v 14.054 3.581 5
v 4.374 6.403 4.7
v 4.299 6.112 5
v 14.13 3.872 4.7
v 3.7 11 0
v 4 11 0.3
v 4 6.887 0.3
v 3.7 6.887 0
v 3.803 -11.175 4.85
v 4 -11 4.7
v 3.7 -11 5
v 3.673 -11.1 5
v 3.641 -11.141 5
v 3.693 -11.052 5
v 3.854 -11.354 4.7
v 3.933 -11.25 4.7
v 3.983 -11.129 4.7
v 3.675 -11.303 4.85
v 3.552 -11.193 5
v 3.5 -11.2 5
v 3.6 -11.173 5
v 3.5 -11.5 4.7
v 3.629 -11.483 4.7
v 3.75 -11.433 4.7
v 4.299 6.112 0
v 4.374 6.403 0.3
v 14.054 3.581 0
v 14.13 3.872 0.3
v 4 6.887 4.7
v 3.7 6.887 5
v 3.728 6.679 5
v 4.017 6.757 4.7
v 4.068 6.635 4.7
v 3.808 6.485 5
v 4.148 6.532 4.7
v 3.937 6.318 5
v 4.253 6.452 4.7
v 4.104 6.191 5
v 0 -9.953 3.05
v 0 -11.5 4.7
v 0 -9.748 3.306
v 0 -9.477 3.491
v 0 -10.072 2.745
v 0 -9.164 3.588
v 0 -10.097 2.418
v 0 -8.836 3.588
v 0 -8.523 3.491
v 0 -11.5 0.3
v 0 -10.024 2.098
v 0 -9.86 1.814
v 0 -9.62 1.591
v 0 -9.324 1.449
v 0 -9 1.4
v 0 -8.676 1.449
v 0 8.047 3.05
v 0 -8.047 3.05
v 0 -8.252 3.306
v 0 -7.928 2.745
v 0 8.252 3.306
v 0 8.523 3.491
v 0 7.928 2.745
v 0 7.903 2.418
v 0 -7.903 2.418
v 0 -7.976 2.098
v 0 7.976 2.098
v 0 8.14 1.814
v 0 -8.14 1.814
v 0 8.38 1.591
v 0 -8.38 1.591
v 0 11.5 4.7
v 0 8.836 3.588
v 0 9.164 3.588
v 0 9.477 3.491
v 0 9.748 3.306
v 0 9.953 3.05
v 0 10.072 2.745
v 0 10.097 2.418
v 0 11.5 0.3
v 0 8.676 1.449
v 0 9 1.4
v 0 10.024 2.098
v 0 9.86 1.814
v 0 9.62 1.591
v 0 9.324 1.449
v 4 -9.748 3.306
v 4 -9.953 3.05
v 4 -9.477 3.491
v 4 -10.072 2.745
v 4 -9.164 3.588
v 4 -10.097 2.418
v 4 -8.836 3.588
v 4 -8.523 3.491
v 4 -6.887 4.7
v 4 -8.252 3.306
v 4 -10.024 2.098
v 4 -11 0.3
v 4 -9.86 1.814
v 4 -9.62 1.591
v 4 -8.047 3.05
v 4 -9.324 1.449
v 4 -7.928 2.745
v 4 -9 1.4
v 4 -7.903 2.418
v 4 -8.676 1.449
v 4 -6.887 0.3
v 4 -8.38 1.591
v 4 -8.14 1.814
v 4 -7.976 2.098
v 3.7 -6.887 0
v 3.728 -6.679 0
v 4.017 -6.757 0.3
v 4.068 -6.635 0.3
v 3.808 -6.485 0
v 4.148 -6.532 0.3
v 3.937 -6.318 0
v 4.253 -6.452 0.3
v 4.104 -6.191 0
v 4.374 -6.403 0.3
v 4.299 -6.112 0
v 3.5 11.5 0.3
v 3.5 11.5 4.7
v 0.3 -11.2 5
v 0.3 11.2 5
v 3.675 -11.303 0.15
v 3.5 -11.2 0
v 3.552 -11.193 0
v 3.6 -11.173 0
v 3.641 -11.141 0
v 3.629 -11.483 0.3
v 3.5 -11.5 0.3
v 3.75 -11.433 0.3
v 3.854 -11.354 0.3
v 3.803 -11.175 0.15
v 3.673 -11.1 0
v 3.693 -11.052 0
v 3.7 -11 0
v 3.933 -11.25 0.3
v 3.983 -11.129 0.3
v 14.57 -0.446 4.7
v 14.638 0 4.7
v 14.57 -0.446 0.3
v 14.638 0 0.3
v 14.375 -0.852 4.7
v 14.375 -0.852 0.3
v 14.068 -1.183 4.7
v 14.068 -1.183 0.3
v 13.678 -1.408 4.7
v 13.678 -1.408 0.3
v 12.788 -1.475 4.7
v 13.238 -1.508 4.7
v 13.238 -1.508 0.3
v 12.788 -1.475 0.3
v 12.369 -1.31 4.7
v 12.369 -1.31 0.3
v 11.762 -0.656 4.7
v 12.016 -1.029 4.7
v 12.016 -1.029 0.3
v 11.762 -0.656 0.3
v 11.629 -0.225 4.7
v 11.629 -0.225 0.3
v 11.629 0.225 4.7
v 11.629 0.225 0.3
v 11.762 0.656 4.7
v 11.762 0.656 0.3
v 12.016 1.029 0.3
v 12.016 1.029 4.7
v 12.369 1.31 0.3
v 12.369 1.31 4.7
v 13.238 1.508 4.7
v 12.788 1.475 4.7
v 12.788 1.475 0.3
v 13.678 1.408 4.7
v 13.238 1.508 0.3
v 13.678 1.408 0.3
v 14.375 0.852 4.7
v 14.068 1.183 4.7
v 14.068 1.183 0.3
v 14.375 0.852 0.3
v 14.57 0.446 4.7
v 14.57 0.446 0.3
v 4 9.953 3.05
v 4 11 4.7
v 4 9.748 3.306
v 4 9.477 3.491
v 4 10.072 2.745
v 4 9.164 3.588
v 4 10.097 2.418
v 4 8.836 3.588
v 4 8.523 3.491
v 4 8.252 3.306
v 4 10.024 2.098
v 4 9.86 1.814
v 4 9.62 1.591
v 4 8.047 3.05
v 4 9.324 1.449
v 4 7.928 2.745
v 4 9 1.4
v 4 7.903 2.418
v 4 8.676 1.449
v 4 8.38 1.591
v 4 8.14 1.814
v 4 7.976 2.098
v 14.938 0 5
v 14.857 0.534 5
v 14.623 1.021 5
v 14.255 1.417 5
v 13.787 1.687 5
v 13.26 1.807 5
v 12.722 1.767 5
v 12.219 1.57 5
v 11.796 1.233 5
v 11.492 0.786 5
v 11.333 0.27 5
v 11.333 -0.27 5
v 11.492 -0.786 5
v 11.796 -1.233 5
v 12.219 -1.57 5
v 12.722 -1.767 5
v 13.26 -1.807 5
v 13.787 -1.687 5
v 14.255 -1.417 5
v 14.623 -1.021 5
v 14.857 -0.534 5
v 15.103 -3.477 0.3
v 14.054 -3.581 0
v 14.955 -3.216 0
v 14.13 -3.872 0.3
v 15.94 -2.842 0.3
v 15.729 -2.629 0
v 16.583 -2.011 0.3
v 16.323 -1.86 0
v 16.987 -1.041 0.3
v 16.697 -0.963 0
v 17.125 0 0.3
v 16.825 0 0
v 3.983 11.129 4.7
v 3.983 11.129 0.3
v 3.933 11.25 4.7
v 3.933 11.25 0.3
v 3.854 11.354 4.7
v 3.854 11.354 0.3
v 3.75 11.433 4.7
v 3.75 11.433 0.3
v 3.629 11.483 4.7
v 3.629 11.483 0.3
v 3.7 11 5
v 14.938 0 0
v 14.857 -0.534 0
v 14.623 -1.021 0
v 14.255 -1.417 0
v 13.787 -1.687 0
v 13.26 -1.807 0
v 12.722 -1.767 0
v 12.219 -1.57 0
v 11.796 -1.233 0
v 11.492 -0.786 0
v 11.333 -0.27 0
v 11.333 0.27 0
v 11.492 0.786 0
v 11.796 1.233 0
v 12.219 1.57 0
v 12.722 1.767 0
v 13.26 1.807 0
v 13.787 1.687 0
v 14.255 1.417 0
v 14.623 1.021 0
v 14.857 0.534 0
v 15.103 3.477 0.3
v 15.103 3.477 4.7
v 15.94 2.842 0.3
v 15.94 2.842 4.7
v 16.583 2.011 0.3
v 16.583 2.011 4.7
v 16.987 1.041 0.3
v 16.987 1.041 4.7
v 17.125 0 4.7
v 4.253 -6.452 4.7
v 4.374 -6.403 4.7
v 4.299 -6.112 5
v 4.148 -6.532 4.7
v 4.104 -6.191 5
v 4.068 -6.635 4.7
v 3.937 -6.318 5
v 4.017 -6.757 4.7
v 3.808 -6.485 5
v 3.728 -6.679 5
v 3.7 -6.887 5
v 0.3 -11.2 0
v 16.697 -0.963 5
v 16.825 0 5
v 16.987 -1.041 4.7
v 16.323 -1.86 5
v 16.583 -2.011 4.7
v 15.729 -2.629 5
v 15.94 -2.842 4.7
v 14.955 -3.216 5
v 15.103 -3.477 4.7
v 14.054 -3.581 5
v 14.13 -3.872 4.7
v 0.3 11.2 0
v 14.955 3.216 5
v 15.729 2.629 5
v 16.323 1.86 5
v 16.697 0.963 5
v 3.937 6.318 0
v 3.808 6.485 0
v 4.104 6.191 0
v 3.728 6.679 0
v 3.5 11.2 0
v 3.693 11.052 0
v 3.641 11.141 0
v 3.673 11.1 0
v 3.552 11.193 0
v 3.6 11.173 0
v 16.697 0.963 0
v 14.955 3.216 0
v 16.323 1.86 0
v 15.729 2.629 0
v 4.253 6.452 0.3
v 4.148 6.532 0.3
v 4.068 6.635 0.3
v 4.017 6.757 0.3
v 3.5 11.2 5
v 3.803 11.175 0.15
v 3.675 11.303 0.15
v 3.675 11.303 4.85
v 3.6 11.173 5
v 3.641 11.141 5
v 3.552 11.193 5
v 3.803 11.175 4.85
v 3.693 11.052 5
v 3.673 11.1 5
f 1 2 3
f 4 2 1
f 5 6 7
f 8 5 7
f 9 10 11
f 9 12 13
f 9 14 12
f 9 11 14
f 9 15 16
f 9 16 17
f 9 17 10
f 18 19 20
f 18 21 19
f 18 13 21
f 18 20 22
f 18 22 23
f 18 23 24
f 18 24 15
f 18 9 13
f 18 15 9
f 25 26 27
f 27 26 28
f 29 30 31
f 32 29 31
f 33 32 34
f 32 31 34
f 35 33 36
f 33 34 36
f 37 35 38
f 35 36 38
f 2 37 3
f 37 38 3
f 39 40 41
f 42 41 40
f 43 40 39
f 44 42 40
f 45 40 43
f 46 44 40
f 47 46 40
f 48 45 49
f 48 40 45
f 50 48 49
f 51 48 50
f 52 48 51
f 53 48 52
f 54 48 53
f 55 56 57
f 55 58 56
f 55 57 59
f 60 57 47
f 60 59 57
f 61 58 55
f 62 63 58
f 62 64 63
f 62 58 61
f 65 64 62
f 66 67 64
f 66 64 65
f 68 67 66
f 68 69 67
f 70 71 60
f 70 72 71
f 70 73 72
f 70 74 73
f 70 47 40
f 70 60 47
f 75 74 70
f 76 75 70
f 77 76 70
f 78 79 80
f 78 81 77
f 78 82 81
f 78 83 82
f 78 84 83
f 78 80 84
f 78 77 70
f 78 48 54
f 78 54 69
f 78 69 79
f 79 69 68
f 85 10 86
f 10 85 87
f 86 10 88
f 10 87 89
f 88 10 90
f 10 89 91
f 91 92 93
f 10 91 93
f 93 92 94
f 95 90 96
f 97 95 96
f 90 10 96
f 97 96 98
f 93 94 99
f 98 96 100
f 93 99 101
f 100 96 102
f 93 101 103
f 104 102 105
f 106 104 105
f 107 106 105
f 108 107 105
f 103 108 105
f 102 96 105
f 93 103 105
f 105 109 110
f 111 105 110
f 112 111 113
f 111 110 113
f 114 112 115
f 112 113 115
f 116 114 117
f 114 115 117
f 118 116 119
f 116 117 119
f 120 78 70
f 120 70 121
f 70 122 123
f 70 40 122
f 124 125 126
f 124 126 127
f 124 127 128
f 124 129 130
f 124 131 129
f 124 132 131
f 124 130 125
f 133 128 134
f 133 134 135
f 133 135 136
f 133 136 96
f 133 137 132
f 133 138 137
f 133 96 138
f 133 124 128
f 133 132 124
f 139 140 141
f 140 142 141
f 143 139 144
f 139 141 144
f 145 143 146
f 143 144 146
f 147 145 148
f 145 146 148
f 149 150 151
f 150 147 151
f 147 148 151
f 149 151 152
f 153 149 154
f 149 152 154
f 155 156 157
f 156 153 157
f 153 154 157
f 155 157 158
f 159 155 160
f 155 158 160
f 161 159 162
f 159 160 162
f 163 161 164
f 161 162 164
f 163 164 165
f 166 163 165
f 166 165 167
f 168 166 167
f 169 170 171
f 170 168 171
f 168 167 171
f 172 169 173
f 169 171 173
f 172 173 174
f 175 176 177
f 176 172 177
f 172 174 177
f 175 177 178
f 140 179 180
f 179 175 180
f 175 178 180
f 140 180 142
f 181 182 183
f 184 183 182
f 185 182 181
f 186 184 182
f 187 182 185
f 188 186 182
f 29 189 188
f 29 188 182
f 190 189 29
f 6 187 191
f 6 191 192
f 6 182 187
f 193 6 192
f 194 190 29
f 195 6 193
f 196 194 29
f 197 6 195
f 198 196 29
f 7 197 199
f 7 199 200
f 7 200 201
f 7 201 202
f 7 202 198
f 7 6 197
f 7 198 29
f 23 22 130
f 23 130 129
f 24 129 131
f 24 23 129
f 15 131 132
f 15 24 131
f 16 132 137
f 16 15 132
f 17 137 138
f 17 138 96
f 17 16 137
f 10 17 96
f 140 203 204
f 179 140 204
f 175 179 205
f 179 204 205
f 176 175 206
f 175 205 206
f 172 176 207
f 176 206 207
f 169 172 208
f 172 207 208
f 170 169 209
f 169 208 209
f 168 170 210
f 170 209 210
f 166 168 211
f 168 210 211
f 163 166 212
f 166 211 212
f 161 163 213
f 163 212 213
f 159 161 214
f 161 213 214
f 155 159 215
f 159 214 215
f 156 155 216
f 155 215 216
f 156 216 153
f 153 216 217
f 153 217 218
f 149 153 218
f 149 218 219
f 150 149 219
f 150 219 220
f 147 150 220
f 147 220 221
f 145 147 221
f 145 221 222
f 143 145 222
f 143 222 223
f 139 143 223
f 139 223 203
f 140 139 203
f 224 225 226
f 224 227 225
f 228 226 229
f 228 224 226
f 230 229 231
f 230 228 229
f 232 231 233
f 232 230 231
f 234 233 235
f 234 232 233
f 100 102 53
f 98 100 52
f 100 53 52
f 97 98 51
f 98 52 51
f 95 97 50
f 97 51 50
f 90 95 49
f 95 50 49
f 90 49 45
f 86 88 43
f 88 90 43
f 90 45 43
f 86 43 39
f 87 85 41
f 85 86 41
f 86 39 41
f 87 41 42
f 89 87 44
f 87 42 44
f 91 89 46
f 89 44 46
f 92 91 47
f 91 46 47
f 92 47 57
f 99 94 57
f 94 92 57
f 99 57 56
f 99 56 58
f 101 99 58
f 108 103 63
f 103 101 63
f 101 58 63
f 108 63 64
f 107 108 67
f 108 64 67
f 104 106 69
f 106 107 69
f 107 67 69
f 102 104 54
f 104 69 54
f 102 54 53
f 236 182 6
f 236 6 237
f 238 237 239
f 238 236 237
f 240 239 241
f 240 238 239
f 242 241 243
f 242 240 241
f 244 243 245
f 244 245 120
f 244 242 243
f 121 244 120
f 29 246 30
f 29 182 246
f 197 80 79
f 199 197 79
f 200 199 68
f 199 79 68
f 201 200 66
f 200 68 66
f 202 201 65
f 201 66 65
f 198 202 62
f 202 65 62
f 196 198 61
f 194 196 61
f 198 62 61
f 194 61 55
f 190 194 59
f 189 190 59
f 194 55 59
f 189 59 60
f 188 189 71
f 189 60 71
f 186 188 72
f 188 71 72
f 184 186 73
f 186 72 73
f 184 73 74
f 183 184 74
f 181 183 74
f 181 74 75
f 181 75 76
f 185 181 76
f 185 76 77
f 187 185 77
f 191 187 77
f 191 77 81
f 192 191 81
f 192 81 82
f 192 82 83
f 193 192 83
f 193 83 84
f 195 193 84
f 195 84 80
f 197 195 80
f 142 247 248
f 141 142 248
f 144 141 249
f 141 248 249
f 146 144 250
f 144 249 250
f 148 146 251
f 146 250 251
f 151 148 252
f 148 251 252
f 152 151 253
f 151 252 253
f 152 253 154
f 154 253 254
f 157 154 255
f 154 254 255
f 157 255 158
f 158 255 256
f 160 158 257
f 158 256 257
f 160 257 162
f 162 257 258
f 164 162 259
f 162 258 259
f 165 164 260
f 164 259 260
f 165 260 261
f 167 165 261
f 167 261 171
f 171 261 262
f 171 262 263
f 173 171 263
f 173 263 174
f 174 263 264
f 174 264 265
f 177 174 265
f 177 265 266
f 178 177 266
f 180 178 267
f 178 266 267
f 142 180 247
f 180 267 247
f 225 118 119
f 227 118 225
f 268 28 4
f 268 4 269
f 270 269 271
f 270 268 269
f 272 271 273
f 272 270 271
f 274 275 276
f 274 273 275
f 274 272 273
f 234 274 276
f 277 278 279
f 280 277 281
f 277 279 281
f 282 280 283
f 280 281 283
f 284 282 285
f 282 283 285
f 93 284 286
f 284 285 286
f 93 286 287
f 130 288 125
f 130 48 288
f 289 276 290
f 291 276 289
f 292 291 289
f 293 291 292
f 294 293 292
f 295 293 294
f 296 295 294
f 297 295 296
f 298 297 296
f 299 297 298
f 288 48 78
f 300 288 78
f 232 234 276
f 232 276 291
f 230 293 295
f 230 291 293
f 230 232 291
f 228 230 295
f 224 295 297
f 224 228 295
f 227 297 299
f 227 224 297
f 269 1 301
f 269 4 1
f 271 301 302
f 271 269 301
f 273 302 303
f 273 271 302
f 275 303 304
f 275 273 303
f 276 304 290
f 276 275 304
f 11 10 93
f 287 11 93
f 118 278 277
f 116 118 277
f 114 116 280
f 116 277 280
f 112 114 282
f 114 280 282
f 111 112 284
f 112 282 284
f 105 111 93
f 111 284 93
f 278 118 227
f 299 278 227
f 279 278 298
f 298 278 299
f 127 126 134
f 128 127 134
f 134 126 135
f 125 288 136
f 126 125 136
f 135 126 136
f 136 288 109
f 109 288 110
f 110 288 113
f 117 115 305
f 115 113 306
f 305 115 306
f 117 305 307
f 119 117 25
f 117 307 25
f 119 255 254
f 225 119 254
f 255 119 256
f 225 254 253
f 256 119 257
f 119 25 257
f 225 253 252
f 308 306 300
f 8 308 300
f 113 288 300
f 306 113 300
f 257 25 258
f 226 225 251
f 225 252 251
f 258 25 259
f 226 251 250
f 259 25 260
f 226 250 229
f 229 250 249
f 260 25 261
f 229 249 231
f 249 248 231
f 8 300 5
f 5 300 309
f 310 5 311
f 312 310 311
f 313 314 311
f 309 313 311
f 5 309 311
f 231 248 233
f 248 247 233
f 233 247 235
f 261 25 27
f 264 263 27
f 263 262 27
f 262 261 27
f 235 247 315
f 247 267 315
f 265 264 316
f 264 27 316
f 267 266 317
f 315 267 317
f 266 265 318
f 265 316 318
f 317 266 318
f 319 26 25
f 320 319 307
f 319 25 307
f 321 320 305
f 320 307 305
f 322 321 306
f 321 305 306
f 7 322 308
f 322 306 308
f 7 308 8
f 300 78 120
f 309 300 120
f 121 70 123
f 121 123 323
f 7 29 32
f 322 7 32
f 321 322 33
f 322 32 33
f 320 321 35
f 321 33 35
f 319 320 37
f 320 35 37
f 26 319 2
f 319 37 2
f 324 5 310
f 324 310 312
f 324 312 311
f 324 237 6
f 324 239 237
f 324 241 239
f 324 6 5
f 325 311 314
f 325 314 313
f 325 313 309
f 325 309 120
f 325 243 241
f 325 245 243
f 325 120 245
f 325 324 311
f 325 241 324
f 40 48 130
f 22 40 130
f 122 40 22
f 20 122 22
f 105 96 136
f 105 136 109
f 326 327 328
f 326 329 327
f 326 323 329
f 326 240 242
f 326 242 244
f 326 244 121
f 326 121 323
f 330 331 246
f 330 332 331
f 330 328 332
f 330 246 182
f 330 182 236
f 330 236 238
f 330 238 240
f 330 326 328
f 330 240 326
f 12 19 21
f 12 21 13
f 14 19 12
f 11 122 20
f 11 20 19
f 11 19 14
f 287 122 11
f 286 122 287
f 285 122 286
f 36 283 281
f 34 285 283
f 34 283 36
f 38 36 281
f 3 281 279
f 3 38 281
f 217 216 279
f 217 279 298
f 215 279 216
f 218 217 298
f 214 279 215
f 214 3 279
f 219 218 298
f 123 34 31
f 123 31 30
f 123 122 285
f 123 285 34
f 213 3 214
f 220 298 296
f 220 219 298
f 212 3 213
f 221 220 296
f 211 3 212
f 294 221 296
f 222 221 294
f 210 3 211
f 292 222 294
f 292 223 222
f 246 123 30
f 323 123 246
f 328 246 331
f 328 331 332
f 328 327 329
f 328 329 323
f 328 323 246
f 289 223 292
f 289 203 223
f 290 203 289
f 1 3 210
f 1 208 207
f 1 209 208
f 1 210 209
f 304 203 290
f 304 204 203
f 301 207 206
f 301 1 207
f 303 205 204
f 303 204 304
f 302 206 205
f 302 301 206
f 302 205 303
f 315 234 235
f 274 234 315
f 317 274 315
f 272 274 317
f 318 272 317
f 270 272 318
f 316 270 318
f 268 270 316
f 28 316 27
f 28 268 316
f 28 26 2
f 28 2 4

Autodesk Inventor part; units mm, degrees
ref_plane "YZ Plane" through (0, 0, 0) normal (1, 0, 0) x (0, 1, 0)
ref_plane "XZ Plane" through (0, 0, 0) normal (0, 1, 0) x (-1, 0, 0)
ref_plane "XY Plane" through (0, 0, 0) normal (0, 0, 1) x (1, 0, 0)
sketch "Sketch1" plane through (0, 0, 0) normal (0, 0, 1) x (1, 0, 0)
  line L0 (0, 0) -> (0, 11.5)
  line L1 (0, 11.5) -> (4, 11.5)
  line L2 (4, 11.5) -> (4, 6.5)
  line L3 (4, 6.5) -> (14.1296, 3.8718)
  line L4 (-3.5573, 0) -> (21.3437, 0) construction
  circle A0 centre (13.125, 0) radius 1.5125
  arc A1 (17.125, 0) -> (14.1296, 3.8718) centre (13.125, 0) ccw
  line L5 (0, 0) -> (0, -11.5)
  line L6 (0, -11.5) -> (4, -11.5)
  line L7 (4, -11.5) -> (4, -6.5)
  line L8 (4, -6.5) -> (14.1296, -3.8718)
  arc A2 (14.1296, -3.8718) -> (17.125, 0) centre (13.125, 0) ccw
  dimension "d0" = 3.025
  dimension "d1" = 13.125
  dimension "d2" = 4
  dimension "d3" = 11.5
  dimension "d4" = 4
  dimension "d5" = 5
extrude "Extrusion1" add sketch "Sketch1" along normal blind 5
fillet "Fillet1" radius 0.5 4 edges at (4, 6.5, 2.5) (4, -6.5, 2.5) (4, -11.5, 2.5) (4, 11.5, 2.5)
chamfer "Chamfer1" distance 0.3 angle 45 26 edges at (16.2887, 2.4476, 0) (9.252, -5.1373, 0) (4.1045, -6.5809, 0) (4, -8.9434, 0) (3.8536, -11.3536, 0) (1.75, -11.5, 0) (9.252, 5.1373, 0) (4.1045, 6.5809, 0) (4, 8.9434, 0) (3.8536, 11.3536, 0) (1.75, 11.5, 0) (11.6125, 0, 0) (0, 5.75, 0) (4, -8.9434, 5) (4.1045, -6.5809, 5) (9.252, -5.1373, 5) (16.2887, 2.4476, 5) (9.252, 5.1373, 5) (4.1045, 6.5809, 5) (4, 8.9434, 5) (3.8536, 11.3536, 5) (1.75, 11.5, 5) (3.8536, -11.3536, 5) (1.75, -11.5, 5) (11.6125, 0, 5) (0, -5.75, 5)
hole "Hole1" at (4, 9, 2.5) direction (-1, 0, 0) diameter 2.2 end through all
mirror "Mirror1" about plane through (0, 0, 0) normal (0, 1, 0) of "Hole1"
equation "\"d0\" = bore_clearance"
equation "\"d1\" = -0.5 * finger_width + 0.5 * dist_hinge_points"
equation "\"d9\" = champfer"
equation "\"finger_width\" = 25"
equation "\"finger_thickness\" = 8"
equation "\"finger_part_A_length\" = 42.8625"
equation "\"finger_part_B_length\" = 28.575"
equation "\"finger_link_width\" = 3.5"
equation "\"finger_link_clearence\" = 0.075"
equation "\"tol\" = 0.5 * finger_link_clearence"
equation "\"link_tol\" = 0.254"
equation "\"bore_press\" = 2.925"
equation "\"bore_clearance\" = 3.025"
equation "\"bar_diameter\" = 6.5"
equation "\"bar_thickness\" = 4"
equation "\"bar_width\" = 7"
equation "\"hinge_dist_sym_plane\" = 4"
equation "\"hinge_thickness\" = 3"
equation "\"hinge_act_length_c\" = 7.62"
equation "\"hinge_act_length_bc\" = 16.66875"
equation "\"hinge_act_length_ab\" = 11.049"
equation "\"hinge_act_length_a\" = 21.43125"
equation "\"hinge_guid_length_c\" = 9.525"
equation "\"hinge_guid_length_bc\" = 9.525"
equation "\"hinge_guid_length_ab\" = 17.145"
equation "\"hinge_guid_length_a\" = 17.145"
equation "\"bar_length_bc\" = finger_part_B_length"
equation "\"bar_act_length_ab\" = 40.48125"
equation "\"bar_guid_length_ab\" = 43.275"
equation "\"champfer\" = 0.3"
equation "\"fillet\" = 0.4"
equation "\"gear_diameter\" = 14"
equation "\"dist_finger_BC\" = 56.5"
equation "\"hinge_point\" = 15"
equation "\"dist_hinge_points\" = 51.25"
properties part number "hinge-axis_mount"
